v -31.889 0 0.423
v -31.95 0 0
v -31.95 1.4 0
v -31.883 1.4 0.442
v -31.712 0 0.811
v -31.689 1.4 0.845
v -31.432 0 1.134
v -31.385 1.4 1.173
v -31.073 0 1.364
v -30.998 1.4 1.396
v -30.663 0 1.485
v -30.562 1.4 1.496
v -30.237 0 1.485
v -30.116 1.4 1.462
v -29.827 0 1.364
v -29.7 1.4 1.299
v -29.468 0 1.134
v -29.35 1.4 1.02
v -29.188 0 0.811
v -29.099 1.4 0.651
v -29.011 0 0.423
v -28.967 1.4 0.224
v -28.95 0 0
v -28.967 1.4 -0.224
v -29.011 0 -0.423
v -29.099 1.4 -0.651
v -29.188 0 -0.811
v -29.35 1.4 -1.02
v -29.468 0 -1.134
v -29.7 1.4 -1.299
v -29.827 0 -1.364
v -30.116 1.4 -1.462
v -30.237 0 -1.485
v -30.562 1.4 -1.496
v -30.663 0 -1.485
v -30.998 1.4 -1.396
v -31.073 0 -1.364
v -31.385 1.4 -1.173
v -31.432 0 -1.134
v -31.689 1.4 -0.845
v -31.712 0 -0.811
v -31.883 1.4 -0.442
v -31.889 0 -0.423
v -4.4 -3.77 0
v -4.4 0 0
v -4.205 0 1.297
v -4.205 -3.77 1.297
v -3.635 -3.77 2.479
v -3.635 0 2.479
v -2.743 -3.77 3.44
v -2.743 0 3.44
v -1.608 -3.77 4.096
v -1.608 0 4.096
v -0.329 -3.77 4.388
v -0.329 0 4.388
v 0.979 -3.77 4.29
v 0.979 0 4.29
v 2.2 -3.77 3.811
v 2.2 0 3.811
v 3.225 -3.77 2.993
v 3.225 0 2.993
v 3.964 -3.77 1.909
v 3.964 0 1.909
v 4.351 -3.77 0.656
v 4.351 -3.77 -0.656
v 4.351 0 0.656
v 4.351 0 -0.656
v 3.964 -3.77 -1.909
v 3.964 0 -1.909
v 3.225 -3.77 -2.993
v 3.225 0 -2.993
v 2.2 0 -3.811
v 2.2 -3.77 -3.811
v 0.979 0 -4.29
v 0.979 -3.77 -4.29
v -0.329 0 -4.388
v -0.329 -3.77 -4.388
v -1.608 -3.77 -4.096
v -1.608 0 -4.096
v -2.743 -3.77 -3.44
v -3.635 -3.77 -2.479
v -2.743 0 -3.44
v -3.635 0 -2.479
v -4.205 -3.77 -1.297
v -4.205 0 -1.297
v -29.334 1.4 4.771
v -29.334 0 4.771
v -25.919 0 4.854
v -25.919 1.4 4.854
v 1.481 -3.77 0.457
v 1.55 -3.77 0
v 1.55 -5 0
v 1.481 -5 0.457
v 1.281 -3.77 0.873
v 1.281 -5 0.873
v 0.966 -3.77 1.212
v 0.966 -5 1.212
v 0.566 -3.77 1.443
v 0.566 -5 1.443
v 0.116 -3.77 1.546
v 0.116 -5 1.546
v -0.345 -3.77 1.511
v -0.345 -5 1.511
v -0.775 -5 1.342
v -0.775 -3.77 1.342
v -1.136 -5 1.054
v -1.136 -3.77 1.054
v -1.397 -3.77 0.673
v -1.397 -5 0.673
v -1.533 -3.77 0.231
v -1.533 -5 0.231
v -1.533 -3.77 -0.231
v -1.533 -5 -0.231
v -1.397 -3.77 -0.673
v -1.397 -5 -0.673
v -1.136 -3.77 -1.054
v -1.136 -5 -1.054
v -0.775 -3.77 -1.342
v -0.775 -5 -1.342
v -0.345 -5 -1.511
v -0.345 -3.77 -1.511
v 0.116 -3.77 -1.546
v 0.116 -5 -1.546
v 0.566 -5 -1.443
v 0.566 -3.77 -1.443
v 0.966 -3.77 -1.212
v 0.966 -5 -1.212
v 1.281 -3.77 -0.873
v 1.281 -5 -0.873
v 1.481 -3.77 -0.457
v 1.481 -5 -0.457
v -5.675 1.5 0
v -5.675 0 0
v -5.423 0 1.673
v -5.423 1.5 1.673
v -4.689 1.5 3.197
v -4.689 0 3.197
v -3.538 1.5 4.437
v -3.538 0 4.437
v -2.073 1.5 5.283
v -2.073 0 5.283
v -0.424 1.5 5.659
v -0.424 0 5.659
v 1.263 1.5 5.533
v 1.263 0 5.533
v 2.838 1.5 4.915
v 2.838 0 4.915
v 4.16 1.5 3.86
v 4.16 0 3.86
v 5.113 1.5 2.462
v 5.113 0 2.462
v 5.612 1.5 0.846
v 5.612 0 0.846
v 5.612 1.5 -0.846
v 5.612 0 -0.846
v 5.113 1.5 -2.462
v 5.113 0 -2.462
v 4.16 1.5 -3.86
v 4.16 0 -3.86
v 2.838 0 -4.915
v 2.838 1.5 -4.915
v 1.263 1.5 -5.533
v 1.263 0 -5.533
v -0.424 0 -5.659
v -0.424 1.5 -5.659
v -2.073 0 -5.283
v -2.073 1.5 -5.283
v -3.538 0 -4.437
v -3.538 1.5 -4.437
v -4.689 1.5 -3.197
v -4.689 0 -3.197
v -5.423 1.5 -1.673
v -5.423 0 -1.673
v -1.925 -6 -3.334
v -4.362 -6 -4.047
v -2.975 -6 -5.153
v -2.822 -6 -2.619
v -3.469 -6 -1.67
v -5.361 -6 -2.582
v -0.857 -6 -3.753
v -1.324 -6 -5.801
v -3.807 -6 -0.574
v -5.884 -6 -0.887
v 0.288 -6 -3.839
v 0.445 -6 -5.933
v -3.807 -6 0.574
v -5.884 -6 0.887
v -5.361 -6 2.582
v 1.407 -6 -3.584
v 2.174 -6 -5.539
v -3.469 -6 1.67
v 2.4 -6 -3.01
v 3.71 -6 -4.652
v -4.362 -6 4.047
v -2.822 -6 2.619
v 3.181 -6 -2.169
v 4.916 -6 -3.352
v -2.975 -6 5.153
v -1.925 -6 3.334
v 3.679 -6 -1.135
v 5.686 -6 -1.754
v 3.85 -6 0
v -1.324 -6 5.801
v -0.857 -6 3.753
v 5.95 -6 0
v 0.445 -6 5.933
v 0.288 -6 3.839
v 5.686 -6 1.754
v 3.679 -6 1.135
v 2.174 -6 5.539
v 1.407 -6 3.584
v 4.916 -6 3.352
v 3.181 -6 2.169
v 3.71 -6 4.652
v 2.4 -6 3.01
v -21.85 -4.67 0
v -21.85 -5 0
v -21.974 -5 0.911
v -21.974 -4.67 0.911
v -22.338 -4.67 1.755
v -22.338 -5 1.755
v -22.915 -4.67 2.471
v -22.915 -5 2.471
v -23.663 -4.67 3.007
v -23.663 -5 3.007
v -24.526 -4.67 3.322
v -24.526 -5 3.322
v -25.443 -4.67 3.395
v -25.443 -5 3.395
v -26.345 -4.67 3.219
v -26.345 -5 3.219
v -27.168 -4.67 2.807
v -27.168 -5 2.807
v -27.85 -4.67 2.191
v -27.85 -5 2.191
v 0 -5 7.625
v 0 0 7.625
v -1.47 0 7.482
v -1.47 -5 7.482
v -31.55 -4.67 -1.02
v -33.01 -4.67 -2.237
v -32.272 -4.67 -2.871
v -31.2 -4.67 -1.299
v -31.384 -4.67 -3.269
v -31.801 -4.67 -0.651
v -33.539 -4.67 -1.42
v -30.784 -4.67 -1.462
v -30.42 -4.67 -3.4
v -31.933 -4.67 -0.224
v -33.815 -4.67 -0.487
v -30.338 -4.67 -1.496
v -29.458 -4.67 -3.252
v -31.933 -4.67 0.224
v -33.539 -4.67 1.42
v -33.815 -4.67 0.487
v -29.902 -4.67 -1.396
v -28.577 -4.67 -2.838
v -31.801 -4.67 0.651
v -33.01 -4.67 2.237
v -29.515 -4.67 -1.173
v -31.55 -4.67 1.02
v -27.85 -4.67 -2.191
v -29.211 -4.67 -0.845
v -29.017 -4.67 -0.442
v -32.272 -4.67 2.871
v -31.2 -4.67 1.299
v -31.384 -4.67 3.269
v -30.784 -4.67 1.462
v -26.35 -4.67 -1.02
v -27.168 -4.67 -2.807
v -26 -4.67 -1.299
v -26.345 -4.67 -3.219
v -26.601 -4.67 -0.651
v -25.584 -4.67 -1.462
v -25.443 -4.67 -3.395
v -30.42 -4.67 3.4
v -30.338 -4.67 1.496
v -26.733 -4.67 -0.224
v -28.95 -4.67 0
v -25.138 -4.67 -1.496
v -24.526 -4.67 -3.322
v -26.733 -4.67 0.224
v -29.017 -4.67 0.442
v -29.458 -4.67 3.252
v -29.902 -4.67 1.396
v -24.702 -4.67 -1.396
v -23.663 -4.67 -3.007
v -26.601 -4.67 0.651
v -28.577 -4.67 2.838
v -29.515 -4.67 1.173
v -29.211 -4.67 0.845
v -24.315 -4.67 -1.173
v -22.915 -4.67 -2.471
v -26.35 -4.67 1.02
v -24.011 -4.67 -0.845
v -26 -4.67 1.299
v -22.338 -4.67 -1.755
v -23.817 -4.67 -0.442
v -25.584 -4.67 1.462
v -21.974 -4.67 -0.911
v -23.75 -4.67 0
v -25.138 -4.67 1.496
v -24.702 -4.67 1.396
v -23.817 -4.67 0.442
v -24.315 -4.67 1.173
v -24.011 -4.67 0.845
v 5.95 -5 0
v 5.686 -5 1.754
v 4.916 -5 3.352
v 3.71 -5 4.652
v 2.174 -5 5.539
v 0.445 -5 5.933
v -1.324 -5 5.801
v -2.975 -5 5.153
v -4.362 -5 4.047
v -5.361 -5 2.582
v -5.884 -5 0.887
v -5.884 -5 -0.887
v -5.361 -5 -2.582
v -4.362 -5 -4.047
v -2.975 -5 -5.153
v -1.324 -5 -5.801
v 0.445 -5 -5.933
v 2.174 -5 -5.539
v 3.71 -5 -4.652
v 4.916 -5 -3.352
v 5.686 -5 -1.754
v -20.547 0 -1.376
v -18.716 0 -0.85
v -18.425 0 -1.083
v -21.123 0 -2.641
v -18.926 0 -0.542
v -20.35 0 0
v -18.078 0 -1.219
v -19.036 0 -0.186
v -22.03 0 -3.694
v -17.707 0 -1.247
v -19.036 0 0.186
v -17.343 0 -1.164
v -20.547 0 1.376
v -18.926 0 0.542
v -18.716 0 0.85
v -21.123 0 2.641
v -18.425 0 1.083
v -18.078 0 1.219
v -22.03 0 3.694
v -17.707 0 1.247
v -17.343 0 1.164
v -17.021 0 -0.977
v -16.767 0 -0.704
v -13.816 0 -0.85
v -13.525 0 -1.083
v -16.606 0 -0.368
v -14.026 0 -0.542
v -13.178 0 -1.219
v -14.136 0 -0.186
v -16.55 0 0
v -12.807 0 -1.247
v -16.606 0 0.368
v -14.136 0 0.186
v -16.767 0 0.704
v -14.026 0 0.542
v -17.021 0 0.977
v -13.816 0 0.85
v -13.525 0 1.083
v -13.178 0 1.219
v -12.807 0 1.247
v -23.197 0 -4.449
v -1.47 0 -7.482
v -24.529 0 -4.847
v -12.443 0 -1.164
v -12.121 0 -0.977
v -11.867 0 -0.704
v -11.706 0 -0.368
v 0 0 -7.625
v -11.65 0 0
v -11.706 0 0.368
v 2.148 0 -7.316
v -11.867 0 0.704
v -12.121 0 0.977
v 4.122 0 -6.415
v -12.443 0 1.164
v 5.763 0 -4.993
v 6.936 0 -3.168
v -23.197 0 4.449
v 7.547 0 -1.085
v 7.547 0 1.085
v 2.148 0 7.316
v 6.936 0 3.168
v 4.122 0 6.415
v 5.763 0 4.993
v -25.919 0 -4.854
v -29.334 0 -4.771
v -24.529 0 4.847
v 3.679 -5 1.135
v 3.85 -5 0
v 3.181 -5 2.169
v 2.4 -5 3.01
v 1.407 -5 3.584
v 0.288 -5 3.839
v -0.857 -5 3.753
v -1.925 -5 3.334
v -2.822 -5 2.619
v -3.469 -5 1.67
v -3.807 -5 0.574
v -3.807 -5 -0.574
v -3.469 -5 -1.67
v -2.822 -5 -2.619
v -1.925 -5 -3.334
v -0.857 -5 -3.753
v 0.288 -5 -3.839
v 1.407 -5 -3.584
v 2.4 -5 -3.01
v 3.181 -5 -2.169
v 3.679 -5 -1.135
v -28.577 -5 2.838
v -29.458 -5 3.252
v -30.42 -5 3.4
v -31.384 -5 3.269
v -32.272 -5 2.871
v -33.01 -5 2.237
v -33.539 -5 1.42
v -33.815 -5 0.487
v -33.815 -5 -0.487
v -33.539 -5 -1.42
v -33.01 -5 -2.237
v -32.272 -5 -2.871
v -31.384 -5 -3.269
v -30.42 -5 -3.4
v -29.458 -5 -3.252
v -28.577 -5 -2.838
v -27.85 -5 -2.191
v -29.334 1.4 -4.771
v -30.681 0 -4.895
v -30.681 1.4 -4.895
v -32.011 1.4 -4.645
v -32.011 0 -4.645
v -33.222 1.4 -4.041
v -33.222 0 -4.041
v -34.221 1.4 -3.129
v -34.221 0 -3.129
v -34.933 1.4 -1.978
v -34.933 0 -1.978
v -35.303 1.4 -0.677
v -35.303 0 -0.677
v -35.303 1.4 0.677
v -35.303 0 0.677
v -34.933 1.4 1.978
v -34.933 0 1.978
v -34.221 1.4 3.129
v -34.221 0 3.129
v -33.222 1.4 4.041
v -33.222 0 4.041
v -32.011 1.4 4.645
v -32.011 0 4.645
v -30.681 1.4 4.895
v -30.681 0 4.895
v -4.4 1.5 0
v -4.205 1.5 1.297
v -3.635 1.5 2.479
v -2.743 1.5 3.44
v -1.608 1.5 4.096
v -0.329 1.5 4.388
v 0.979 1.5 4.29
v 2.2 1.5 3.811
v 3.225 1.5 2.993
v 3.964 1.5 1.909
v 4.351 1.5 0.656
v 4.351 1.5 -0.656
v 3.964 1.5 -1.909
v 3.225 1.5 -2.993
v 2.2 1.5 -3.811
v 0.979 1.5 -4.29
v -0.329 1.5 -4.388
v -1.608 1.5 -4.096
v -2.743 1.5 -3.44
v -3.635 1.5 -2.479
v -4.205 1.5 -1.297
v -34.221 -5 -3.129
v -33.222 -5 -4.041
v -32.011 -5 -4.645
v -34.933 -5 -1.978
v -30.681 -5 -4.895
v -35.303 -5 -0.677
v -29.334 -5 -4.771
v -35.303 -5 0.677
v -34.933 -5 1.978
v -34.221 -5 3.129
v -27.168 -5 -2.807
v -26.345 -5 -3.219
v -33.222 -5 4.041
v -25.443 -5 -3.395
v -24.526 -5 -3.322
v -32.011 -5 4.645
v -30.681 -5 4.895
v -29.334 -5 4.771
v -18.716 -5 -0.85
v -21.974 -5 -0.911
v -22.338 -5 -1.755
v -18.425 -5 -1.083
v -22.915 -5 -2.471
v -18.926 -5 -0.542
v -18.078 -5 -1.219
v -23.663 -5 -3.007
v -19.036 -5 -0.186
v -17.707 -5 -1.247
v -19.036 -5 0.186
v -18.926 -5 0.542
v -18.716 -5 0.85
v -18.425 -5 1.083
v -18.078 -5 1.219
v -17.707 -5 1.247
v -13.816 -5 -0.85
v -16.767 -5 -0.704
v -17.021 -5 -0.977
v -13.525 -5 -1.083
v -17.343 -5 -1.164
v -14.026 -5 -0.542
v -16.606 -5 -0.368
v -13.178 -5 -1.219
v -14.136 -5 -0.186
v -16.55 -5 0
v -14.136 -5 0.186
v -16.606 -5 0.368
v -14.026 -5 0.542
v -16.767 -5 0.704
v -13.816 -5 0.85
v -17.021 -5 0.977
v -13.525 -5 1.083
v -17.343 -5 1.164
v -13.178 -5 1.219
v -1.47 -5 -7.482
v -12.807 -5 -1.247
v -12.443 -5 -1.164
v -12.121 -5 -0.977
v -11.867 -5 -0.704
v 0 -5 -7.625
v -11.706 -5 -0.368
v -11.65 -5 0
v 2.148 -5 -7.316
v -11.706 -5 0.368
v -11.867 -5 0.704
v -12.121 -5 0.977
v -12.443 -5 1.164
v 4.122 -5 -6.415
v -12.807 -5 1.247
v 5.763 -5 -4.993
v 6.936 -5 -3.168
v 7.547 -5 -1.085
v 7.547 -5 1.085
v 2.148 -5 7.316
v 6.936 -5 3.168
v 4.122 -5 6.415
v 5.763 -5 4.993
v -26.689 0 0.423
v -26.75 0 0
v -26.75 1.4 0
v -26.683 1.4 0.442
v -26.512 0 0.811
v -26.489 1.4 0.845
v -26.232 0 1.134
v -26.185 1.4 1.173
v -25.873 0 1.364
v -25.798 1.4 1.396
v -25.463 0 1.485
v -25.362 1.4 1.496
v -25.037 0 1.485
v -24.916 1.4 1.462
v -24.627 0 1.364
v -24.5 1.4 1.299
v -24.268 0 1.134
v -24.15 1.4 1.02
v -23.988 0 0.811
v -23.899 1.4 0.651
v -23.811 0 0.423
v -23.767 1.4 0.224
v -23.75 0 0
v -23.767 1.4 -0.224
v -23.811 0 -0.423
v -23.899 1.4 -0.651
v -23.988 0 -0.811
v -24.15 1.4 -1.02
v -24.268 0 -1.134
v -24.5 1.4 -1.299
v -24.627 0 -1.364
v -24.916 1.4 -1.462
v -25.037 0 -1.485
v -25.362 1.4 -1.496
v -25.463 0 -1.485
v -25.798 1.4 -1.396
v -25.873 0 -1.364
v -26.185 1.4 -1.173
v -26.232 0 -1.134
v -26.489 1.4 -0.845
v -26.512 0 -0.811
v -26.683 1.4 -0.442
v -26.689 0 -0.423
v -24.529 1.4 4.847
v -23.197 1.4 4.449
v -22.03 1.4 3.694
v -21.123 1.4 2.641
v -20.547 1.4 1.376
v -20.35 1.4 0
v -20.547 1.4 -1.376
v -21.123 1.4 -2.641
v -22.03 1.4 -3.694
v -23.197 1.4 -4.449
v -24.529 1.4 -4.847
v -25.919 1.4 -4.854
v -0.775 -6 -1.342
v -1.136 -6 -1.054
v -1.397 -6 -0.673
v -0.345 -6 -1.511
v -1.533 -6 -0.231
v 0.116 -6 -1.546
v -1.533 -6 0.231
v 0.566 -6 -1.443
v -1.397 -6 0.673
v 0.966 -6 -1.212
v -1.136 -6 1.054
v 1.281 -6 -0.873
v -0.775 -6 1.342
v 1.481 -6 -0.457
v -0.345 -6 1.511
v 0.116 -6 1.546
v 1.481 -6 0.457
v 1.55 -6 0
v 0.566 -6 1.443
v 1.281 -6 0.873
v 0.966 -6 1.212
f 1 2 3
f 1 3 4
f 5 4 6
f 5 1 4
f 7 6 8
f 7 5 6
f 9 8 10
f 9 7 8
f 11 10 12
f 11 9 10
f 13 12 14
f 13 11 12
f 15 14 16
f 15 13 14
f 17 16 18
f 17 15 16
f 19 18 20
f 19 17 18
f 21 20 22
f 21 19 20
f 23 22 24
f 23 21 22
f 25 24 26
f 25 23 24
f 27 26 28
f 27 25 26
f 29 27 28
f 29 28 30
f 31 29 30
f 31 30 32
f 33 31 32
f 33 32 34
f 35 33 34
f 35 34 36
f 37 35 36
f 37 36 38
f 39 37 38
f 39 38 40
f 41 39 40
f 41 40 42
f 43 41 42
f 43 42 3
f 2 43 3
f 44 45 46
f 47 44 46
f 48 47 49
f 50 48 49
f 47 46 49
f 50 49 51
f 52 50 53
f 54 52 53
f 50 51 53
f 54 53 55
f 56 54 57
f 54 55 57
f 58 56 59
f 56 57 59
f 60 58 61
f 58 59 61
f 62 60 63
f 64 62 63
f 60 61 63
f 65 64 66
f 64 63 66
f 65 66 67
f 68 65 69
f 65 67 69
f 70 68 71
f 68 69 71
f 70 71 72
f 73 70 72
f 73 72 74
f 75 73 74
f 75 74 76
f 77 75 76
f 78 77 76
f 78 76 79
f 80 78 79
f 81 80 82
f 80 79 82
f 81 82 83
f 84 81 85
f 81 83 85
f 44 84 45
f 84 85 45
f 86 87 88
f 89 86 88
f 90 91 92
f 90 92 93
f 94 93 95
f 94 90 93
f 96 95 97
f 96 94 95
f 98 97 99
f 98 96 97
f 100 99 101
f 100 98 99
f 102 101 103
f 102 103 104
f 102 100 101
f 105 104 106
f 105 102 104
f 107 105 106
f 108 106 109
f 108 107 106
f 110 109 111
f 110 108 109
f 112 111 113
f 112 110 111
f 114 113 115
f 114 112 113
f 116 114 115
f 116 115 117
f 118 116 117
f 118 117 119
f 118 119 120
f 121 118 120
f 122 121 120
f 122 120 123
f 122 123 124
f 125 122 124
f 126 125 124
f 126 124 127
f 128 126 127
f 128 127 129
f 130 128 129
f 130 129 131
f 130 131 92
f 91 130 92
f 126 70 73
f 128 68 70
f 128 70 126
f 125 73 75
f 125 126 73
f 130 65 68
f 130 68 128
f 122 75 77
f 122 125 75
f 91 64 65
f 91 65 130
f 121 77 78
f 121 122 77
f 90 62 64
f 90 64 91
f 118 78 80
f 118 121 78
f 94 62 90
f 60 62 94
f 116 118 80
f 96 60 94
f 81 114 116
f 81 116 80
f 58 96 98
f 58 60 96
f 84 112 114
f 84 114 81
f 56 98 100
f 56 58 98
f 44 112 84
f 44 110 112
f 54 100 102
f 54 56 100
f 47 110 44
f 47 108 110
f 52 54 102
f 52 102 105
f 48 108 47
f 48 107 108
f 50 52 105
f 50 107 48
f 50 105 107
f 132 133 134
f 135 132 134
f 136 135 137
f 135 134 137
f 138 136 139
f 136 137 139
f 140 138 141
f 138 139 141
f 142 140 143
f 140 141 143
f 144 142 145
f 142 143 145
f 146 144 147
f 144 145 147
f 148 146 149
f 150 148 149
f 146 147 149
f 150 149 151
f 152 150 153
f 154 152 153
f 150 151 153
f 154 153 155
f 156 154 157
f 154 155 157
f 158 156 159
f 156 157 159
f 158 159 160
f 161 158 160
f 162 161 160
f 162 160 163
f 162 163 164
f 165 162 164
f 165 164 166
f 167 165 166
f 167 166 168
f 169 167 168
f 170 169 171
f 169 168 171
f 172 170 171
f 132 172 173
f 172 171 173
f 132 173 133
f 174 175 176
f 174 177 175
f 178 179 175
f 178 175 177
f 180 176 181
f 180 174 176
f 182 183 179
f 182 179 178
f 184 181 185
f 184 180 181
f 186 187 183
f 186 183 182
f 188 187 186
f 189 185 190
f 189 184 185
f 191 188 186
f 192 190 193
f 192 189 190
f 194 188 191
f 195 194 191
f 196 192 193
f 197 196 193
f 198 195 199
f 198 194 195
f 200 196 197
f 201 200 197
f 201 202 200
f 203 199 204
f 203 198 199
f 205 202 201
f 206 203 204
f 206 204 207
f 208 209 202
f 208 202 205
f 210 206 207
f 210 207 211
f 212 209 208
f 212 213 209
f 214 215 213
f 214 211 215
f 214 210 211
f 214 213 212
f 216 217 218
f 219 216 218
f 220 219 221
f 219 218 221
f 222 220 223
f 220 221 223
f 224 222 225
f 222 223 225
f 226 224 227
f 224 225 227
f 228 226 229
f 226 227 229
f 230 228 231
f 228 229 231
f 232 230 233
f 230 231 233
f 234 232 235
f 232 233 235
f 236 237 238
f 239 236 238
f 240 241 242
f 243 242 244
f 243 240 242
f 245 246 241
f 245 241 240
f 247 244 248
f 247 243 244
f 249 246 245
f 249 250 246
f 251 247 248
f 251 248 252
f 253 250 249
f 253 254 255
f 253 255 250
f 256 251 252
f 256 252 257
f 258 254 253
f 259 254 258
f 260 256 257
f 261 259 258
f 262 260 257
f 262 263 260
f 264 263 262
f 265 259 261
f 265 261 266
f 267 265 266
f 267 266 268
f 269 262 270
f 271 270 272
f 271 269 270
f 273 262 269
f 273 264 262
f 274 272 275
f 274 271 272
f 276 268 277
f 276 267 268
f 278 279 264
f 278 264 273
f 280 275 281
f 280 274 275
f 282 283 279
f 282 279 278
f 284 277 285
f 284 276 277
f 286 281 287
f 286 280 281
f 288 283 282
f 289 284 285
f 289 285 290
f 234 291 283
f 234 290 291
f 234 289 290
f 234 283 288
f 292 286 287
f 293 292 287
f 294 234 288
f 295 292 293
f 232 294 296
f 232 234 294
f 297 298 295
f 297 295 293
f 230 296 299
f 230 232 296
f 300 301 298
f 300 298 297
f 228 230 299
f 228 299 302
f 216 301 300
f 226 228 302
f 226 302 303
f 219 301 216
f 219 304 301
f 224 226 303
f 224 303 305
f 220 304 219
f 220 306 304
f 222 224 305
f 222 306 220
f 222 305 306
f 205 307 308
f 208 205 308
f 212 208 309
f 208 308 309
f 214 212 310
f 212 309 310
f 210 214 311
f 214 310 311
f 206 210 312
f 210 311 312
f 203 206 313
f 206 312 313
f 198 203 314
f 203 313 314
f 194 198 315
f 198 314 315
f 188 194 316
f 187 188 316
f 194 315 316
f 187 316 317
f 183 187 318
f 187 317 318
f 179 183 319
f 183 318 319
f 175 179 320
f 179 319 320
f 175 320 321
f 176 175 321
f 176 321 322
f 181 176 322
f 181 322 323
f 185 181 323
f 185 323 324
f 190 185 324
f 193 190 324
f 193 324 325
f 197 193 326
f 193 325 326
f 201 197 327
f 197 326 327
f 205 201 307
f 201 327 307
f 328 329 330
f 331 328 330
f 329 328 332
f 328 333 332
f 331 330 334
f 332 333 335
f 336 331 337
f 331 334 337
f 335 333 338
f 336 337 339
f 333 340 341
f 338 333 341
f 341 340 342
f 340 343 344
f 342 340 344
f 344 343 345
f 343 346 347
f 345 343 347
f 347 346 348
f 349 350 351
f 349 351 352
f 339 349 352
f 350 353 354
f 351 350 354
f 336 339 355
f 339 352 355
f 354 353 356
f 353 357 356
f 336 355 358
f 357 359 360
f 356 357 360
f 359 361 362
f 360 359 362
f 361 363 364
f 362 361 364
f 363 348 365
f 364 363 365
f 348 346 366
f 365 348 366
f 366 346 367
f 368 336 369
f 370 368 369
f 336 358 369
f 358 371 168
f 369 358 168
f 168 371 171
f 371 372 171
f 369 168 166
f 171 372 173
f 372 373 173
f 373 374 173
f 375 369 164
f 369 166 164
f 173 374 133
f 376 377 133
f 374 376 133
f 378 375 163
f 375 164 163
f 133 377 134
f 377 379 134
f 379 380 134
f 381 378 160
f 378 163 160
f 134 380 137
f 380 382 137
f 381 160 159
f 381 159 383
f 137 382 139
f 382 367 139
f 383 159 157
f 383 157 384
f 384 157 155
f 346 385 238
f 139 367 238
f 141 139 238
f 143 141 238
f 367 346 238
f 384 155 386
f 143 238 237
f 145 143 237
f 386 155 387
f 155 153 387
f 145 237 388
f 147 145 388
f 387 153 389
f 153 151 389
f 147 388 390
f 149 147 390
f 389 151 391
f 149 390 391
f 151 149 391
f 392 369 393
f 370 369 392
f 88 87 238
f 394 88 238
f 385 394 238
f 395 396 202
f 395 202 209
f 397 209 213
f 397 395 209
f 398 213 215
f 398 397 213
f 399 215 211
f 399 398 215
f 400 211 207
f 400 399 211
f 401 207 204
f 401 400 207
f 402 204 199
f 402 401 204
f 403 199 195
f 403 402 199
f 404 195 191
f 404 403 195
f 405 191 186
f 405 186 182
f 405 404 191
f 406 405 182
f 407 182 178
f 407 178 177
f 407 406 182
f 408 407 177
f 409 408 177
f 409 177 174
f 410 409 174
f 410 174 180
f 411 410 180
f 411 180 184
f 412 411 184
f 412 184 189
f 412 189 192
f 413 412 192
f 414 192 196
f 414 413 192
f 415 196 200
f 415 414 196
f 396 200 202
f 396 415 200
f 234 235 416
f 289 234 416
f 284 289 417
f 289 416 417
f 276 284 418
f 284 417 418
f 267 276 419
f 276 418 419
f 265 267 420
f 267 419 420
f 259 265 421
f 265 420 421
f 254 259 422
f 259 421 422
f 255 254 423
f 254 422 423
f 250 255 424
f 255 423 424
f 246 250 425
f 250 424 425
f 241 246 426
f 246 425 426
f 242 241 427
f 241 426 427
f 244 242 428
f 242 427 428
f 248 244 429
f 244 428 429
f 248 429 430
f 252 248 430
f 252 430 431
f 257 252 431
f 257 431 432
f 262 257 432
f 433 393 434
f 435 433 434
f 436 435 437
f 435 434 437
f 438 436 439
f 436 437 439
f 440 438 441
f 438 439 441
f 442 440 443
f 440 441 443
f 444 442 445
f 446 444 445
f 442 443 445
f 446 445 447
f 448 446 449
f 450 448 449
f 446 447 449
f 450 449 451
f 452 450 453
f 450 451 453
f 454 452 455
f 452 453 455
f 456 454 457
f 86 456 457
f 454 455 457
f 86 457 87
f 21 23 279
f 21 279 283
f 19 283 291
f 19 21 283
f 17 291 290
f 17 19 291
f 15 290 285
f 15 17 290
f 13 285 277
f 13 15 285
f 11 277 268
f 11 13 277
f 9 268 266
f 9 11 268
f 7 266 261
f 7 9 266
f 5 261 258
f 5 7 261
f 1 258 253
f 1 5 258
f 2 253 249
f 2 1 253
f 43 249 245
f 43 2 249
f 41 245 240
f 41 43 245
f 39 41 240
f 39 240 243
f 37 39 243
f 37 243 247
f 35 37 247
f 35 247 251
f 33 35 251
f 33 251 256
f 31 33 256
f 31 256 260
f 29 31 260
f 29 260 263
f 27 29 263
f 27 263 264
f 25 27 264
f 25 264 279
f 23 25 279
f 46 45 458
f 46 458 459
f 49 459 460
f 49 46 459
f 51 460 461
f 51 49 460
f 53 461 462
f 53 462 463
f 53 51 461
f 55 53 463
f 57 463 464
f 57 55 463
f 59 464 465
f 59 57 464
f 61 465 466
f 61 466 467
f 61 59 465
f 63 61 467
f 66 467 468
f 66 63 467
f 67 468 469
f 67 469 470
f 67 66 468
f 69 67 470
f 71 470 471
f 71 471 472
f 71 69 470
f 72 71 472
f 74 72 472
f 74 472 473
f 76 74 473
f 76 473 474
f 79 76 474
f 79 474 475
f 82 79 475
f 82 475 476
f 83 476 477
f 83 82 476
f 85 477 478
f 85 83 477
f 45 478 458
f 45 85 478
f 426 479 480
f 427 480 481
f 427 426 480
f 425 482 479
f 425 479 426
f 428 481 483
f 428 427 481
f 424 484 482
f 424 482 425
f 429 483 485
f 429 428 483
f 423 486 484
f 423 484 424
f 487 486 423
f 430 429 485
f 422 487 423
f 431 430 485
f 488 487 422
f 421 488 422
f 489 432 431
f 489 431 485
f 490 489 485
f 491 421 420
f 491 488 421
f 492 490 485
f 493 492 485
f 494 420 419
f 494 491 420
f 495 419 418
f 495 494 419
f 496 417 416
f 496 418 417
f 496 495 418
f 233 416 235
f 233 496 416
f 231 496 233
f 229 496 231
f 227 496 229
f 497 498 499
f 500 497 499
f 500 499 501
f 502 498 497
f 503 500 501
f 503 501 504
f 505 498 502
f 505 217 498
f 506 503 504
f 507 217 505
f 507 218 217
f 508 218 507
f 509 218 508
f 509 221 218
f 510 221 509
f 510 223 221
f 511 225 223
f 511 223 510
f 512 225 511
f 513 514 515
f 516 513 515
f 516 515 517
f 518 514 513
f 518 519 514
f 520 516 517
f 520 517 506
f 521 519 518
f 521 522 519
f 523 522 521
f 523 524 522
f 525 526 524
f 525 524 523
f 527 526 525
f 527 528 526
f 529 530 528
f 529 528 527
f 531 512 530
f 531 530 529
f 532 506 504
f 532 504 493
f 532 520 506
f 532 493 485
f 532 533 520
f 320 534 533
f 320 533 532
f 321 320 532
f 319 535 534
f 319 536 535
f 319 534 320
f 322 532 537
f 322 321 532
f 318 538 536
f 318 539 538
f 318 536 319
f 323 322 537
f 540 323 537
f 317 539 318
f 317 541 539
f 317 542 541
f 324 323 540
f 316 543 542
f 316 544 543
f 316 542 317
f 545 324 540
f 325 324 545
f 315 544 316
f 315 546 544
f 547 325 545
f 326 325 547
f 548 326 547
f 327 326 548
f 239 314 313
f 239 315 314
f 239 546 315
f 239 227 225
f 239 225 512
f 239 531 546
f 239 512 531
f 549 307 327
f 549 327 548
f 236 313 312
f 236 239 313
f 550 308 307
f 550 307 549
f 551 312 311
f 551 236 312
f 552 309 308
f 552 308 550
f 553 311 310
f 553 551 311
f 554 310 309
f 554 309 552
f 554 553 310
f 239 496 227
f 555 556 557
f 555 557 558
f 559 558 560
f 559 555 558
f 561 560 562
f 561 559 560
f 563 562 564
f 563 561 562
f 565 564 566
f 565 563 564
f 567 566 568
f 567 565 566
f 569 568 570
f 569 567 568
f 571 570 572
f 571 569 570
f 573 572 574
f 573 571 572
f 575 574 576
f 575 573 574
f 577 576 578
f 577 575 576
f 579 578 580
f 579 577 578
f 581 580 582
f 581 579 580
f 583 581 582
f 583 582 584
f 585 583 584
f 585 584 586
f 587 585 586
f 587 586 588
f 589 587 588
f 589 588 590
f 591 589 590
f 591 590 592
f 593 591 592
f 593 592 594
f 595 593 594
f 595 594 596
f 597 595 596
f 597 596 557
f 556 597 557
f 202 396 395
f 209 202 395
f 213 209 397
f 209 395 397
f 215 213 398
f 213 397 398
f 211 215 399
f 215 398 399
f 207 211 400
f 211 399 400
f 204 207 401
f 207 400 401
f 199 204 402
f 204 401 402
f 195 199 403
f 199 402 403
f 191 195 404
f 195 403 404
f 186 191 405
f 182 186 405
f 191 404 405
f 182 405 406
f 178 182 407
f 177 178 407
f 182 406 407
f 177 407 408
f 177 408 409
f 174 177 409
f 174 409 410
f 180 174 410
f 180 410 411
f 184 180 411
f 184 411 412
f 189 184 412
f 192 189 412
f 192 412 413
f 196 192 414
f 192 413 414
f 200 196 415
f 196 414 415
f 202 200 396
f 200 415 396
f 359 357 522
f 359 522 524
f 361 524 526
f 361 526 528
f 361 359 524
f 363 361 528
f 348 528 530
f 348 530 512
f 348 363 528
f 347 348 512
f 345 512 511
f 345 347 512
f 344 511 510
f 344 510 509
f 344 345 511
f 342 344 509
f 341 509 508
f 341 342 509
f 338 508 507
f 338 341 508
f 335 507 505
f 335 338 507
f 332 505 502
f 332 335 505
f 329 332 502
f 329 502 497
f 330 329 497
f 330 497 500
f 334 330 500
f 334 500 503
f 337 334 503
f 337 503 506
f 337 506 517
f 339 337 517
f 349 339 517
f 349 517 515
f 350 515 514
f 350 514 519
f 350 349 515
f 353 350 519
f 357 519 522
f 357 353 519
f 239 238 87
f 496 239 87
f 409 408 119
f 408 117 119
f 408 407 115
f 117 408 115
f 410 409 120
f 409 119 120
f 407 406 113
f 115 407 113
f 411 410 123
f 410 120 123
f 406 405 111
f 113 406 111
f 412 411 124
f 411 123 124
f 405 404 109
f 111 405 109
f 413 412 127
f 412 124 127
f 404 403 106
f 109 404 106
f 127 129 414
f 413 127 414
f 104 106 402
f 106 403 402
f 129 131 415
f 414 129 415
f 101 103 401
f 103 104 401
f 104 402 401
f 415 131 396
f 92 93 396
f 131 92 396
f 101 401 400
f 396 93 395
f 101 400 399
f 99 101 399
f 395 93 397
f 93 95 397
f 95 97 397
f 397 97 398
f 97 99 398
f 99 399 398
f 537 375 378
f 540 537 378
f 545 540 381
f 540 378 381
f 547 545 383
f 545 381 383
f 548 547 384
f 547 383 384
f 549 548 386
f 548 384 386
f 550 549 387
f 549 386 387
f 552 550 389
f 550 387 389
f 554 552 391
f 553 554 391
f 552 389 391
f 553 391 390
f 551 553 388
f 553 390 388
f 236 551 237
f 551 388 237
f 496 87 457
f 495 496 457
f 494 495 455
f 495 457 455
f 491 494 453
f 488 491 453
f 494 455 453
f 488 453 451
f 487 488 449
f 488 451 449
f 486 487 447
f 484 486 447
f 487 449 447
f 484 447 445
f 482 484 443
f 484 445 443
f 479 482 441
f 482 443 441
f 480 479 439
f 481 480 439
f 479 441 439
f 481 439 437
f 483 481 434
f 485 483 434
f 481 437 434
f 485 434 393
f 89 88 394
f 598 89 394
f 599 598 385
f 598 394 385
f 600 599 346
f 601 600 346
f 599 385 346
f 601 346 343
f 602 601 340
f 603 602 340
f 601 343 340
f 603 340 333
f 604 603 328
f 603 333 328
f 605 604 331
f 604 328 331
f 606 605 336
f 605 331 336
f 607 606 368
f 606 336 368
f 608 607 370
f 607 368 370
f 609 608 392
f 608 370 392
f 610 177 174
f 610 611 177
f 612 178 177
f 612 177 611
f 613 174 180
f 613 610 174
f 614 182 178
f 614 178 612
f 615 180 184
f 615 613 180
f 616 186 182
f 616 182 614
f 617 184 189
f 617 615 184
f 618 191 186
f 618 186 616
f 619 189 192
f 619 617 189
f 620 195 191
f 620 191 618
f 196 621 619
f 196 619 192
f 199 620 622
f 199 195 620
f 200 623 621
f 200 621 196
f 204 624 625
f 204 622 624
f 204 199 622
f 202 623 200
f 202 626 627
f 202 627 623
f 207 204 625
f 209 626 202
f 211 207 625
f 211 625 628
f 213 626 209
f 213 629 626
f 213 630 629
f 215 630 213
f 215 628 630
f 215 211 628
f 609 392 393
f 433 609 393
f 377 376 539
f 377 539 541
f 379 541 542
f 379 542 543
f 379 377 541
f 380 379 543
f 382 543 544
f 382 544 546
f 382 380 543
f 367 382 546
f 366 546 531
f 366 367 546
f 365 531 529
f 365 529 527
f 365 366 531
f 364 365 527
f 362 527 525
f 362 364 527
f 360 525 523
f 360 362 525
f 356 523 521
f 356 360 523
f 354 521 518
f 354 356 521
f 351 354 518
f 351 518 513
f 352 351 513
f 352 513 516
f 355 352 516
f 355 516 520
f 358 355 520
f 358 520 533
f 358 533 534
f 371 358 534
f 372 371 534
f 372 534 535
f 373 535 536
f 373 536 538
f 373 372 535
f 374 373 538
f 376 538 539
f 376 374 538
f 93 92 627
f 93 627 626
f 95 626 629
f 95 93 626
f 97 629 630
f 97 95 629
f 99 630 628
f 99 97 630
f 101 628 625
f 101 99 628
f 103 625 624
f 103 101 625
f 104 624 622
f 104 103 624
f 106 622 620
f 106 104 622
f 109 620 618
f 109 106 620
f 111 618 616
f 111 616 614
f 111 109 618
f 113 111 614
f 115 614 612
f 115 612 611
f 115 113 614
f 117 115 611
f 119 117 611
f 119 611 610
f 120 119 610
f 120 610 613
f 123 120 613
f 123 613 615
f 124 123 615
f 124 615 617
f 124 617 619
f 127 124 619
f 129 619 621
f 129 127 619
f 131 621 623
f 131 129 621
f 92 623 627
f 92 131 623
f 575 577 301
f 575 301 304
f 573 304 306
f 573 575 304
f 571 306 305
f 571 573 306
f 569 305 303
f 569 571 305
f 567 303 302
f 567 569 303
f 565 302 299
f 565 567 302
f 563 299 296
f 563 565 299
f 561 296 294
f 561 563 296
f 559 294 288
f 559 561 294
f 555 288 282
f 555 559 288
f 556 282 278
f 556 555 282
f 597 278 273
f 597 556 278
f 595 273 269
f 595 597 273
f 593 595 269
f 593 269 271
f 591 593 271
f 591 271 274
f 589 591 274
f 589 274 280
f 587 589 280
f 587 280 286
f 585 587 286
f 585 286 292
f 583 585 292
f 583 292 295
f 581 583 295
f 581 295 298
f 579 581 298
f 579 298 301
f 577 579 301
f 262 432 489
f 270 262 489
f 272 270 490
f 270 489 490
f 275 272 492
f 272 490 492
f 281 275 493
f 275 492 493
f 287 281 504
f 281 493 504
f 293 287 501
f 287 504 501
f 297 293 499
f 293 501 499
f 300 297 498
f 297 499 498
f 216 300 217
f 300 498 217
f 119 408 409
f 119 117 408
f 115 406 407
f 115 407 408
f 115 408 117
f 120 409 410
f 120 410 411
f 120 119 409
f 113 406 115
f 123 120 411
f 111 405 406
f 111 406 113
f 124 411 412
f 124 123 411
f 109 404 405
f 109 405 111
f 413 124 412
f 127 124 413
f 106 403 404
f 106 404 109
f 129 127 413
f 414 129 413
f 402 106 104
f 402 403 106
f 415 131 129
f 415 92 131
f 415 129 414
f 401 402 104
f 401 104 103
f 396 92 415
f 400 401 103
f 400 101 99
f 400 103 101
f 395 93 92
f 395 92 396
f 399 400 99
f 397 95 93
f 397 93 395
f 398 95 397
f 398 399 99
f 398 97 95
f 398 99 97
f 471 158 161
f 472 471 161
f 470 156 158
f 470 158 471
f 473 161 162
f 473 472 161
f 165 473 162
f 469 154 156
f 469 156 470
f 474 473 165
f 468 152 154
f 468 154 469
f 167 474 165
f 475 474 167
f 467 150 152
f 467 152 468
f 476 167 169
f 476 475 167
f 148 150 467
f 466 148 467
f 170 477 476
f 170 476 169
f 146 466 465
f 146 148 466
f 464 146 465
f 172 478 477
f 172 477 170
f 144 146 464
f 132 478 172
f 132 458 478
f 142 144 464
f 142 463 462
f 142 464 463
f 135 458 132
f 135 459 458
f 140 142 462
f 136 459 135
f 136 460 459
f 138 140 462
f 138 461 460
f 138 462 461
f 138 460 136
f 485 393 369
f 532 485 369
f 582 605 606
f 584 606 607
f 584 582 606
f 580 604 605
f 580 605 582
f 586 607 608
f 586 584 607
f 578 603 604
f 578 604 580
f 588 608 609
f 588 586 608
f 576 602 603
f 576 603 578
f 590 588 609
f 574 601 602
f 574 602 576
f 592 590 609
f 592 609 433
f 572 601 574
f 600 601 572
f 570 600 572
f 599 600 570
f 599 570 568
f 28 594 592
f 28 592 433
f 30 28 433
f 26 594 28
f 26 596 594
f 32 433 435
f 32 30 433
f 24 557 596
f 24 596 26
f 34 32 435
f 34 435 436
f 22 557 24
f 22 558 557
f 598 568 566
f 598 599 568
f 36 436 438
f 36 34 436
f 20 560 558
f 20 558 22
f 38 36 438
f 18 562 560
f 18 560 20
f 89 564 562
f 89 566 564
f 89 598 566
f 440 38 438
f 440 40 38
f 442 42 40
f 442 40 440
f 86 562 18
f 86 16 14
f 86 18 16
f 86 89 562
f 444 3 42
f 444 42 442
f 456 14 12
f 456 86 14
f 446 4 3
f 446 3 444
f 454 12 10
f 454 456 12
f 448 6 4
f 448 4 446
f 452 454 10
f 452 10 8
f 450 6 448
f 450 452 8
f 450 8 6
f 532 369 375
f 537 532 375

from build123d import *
from build123d import SkipClean  # not in build123d's __all__

# Parameters (mm, degrees)
F0_R     = 1.5
F0_R_2   = 1.25
F0_R_3   = 1.55
F1_DEPTH = 5
F2_R     = 1.5
F3_DEPTH = 0.33
F2_R_2   = 5.95
F2_R_3   = 3.85
F4_DEPTH = 1
F5_R     = 1.5
F6_DEPTH = 1.4
F5_R_2   = 5.675
F5_R_3   = 4.4
F7_DEPTH = 1.5
F5_R_4   = 1.55
F8_DEPTH = 3.77
F2_R_4   = 1.55
F9_DEPTH = 1


# Not quite as in the source:
# - after a boolean that leaves OpenCascade's solid faulty, fix() repairs it


with BuildPart() as f1:
    # F0 (on Front) → F1 (new body)
    with BuildSketch(Plane.XZ):
        with BuildLine():
            Line((-29.334043409, -4.7712305422), (-1.4696901505, -7.4820208408))
            Line((-1.4696901505, -7.4820208408), (0, -7.625))
            ThreePointArc((0, -7.625), (7.625, 0), (0, 7.625))
            Line((0, 7.625), (-1.4696901505, 7.4820208408))
            Line((-1.4696901505, 7.4820208408), (-29.334043409, 4.7712305422))
            ThreePointArc((-29.334043409, 4.7712305422), (-35.35, 0), (-29.334043409, -4.7712305422))
        make_face()
        with Locations((-30.45, 0)):
            Circle(F0_R, mode=Mode.SUBTRACT)
        with Locations((-25.25, 0)):
            Circle(F0_R, mode=Mode.SUBTRACT)
        with Locations((-17.8, 0)):
            Circle(F0_R_2, mode=Mode.SUBTRACT)
        with Locations((-12.9, 0)):
            Circle(F0_R_2, mode=Mode.SUBTRACT)
        Circle(F0_R_3, mode=Mode.SUBTRACT)
    extrude(amount=F1_DEPTH)

    # F2 (on face) → F3 (cut)
    with BuildSketch(Plane.XZ.offset(5)):
        with BuildLine():
            ThreePointArc((-27.85, -2.19089023), (-28.65, 0), (-27.85, 2.19089023))
            ThreePointArc((-27.85, 2.19089023), (-33.85, 0), (-27.85, -2.19089023))
        make_face()
        with Locations((-30.45, 0)):
            Circle(F2_R, mode=Mode.SUBTRACT)
        with BuildLine():
            ThreePointArc((-27.85, -2.19089023), (-27.2562561155, -1.166190379), (-27.05, 0))
            ThreePointArc((-27.05, 0), (-27.2562561155, 1.166190379), (-27.85, 2.19089023))
            ThreePointArc((-27.85, 2.19089023), (-28.65, 0), (-27.85, -2.19089023))
        make_face()
        with BuildLine():
            ThreePointArc((-27.85, 2.19089023), (-27.2562561155, 1.166190379), (-27.05, 0))
            ThreePointArc((-27.05, 0), (-27.2562561155, -1.166190379), (-27.85, -2.19089023))
            ThreePointArc((-27.85, -2.19089023), (-24.083809621, -3.1937438845), (-21.85, 0))
            ThreePointArc((-21.85, 0), (-24.083809621, 3.1937438845), (-27.85, 2.19089023))
        make_face()
        with Locations((-25.25, 0)):
            Circle(F2_R, mode=Mode.SUBTRACT)
    extrude(amount=-F3_DEPTH, mode=Mode.SUBTRACT)

    # F2 (on face) → F4 (join)
    with BuildSketch(Plane.XZ.offset(5)):
        Circle(F2_R_2)
        Circle(F2_R_3, mode=Mode.SUBTRACT)
    extrude(amount=F4_DEPTH)

    # F5 (on face) → F6 (join)
    with BuildSketch(Plane(origin=(0, 0, 0), x_dir=(-1, 0, 0), z_dir=(0, 1, 0))):
        with BuildLine():
            ThreePointArc((25.9187577076, -4.8541490633), (26.9215224824, -4.6060843013), (27.85, -4.1533119315))
            ThreePointArc((27.85, -4.1533119315), (28.5665087739, -4.5235451585), (29.334043409, -4.7712305422))
            ThreePointArc((29.334043409, -4.7712305422), (35.35, 0), (29.334043409, 4.7712305422))
            ThreePointArc((29.334043409, 4.7712305422), (28.5665087739, 4.5235451585), (27.85, 4.1533119315))
            ThreePointArc((27.85, 4.1533119315), (26.9215224824, 4.6060843013), (25.9187577076, 4.8541490633))
            ThreePointArc((25.9187577076, 4.8541490633), (20.35, 0), (25.9187577076, -4.8541490633))
        make_face()
        with Locations((25.25, 0)):
            Circle(F5_R, mode=Mode.SUBTRACT)
        with Locations((30.45, 0)):
            Circle(F5_R, mode=Mode.SUBTRACT)
        with BuildLine():
            ThreePointArc((29.334043409, -4.7712305422), (28.5665087739, -4.5235451585), (27.85, -4.1533119315))
            ThreePointArc((27.85, -4.1533119315), (26.9215224824, -4.6060843013), (25.9187577076, -4.8541490633))
            Line((25.9187577076, -4.8541490633), (29.334043409, -4.7712305422))
        make_face()
        with BuildLine():
            ThreePointArc((27.85, 4.1533119315), (28.5665087739, 4.5235451585), (29.334043409, 4.7712305422))
            Line((29.334043409, 4.7712305422), (25.9187577076, 4.8541490633))
            ThreePointArc((25.9187577076, 4.8541490633), (26.9215224824, 4.6060843013), (27.85, 4.1533119315))
        make_face()
    with SkipClean():  # cleaning this boolean's faces spoils the solid; the shape is the same uncleaned
        extrude(amount=F6_DEPTH)

    # F5 (on face) → F7 (join)
    with BuildSketch(Plane(origin=(0, 0, 0), x_dir=(-1, 0, 0), z_dir=(0, 1, 0))):
        Circle(F5_R_2)
        Circle(F5_R_3, mode=Mode.SUBTRACT)
    extrude(amount=F7_DEPTH)

    add(f1.part.fix(), mode=Mode.REPLACE)

    # F5 (on face) → F8 (cut)
    with BuildSketch(Plane(origin=(0, 0, 0), x_dir=(-1, 0, 0), z_dir=(0, 1, 0))):
        Circle(F5_R_3)
        Circle(F5_R_4, mode=Mode.SUBTRACT)
    extrude(amount=-F8_DEPTH, mode=Mode.SUBTRACT)


with BuildPart() as f9:
    # F2 (on face) → F9 (new body)
    with BuildSketch(Plane.XZ.offset(5)):
        Circle(F2_R_3)
        Circle(F2_R_4, mode=Mode.SUBTRACT)
    extrude(amount=F9_DEPTH)


solid = Compound([f1.part, f9.part])
